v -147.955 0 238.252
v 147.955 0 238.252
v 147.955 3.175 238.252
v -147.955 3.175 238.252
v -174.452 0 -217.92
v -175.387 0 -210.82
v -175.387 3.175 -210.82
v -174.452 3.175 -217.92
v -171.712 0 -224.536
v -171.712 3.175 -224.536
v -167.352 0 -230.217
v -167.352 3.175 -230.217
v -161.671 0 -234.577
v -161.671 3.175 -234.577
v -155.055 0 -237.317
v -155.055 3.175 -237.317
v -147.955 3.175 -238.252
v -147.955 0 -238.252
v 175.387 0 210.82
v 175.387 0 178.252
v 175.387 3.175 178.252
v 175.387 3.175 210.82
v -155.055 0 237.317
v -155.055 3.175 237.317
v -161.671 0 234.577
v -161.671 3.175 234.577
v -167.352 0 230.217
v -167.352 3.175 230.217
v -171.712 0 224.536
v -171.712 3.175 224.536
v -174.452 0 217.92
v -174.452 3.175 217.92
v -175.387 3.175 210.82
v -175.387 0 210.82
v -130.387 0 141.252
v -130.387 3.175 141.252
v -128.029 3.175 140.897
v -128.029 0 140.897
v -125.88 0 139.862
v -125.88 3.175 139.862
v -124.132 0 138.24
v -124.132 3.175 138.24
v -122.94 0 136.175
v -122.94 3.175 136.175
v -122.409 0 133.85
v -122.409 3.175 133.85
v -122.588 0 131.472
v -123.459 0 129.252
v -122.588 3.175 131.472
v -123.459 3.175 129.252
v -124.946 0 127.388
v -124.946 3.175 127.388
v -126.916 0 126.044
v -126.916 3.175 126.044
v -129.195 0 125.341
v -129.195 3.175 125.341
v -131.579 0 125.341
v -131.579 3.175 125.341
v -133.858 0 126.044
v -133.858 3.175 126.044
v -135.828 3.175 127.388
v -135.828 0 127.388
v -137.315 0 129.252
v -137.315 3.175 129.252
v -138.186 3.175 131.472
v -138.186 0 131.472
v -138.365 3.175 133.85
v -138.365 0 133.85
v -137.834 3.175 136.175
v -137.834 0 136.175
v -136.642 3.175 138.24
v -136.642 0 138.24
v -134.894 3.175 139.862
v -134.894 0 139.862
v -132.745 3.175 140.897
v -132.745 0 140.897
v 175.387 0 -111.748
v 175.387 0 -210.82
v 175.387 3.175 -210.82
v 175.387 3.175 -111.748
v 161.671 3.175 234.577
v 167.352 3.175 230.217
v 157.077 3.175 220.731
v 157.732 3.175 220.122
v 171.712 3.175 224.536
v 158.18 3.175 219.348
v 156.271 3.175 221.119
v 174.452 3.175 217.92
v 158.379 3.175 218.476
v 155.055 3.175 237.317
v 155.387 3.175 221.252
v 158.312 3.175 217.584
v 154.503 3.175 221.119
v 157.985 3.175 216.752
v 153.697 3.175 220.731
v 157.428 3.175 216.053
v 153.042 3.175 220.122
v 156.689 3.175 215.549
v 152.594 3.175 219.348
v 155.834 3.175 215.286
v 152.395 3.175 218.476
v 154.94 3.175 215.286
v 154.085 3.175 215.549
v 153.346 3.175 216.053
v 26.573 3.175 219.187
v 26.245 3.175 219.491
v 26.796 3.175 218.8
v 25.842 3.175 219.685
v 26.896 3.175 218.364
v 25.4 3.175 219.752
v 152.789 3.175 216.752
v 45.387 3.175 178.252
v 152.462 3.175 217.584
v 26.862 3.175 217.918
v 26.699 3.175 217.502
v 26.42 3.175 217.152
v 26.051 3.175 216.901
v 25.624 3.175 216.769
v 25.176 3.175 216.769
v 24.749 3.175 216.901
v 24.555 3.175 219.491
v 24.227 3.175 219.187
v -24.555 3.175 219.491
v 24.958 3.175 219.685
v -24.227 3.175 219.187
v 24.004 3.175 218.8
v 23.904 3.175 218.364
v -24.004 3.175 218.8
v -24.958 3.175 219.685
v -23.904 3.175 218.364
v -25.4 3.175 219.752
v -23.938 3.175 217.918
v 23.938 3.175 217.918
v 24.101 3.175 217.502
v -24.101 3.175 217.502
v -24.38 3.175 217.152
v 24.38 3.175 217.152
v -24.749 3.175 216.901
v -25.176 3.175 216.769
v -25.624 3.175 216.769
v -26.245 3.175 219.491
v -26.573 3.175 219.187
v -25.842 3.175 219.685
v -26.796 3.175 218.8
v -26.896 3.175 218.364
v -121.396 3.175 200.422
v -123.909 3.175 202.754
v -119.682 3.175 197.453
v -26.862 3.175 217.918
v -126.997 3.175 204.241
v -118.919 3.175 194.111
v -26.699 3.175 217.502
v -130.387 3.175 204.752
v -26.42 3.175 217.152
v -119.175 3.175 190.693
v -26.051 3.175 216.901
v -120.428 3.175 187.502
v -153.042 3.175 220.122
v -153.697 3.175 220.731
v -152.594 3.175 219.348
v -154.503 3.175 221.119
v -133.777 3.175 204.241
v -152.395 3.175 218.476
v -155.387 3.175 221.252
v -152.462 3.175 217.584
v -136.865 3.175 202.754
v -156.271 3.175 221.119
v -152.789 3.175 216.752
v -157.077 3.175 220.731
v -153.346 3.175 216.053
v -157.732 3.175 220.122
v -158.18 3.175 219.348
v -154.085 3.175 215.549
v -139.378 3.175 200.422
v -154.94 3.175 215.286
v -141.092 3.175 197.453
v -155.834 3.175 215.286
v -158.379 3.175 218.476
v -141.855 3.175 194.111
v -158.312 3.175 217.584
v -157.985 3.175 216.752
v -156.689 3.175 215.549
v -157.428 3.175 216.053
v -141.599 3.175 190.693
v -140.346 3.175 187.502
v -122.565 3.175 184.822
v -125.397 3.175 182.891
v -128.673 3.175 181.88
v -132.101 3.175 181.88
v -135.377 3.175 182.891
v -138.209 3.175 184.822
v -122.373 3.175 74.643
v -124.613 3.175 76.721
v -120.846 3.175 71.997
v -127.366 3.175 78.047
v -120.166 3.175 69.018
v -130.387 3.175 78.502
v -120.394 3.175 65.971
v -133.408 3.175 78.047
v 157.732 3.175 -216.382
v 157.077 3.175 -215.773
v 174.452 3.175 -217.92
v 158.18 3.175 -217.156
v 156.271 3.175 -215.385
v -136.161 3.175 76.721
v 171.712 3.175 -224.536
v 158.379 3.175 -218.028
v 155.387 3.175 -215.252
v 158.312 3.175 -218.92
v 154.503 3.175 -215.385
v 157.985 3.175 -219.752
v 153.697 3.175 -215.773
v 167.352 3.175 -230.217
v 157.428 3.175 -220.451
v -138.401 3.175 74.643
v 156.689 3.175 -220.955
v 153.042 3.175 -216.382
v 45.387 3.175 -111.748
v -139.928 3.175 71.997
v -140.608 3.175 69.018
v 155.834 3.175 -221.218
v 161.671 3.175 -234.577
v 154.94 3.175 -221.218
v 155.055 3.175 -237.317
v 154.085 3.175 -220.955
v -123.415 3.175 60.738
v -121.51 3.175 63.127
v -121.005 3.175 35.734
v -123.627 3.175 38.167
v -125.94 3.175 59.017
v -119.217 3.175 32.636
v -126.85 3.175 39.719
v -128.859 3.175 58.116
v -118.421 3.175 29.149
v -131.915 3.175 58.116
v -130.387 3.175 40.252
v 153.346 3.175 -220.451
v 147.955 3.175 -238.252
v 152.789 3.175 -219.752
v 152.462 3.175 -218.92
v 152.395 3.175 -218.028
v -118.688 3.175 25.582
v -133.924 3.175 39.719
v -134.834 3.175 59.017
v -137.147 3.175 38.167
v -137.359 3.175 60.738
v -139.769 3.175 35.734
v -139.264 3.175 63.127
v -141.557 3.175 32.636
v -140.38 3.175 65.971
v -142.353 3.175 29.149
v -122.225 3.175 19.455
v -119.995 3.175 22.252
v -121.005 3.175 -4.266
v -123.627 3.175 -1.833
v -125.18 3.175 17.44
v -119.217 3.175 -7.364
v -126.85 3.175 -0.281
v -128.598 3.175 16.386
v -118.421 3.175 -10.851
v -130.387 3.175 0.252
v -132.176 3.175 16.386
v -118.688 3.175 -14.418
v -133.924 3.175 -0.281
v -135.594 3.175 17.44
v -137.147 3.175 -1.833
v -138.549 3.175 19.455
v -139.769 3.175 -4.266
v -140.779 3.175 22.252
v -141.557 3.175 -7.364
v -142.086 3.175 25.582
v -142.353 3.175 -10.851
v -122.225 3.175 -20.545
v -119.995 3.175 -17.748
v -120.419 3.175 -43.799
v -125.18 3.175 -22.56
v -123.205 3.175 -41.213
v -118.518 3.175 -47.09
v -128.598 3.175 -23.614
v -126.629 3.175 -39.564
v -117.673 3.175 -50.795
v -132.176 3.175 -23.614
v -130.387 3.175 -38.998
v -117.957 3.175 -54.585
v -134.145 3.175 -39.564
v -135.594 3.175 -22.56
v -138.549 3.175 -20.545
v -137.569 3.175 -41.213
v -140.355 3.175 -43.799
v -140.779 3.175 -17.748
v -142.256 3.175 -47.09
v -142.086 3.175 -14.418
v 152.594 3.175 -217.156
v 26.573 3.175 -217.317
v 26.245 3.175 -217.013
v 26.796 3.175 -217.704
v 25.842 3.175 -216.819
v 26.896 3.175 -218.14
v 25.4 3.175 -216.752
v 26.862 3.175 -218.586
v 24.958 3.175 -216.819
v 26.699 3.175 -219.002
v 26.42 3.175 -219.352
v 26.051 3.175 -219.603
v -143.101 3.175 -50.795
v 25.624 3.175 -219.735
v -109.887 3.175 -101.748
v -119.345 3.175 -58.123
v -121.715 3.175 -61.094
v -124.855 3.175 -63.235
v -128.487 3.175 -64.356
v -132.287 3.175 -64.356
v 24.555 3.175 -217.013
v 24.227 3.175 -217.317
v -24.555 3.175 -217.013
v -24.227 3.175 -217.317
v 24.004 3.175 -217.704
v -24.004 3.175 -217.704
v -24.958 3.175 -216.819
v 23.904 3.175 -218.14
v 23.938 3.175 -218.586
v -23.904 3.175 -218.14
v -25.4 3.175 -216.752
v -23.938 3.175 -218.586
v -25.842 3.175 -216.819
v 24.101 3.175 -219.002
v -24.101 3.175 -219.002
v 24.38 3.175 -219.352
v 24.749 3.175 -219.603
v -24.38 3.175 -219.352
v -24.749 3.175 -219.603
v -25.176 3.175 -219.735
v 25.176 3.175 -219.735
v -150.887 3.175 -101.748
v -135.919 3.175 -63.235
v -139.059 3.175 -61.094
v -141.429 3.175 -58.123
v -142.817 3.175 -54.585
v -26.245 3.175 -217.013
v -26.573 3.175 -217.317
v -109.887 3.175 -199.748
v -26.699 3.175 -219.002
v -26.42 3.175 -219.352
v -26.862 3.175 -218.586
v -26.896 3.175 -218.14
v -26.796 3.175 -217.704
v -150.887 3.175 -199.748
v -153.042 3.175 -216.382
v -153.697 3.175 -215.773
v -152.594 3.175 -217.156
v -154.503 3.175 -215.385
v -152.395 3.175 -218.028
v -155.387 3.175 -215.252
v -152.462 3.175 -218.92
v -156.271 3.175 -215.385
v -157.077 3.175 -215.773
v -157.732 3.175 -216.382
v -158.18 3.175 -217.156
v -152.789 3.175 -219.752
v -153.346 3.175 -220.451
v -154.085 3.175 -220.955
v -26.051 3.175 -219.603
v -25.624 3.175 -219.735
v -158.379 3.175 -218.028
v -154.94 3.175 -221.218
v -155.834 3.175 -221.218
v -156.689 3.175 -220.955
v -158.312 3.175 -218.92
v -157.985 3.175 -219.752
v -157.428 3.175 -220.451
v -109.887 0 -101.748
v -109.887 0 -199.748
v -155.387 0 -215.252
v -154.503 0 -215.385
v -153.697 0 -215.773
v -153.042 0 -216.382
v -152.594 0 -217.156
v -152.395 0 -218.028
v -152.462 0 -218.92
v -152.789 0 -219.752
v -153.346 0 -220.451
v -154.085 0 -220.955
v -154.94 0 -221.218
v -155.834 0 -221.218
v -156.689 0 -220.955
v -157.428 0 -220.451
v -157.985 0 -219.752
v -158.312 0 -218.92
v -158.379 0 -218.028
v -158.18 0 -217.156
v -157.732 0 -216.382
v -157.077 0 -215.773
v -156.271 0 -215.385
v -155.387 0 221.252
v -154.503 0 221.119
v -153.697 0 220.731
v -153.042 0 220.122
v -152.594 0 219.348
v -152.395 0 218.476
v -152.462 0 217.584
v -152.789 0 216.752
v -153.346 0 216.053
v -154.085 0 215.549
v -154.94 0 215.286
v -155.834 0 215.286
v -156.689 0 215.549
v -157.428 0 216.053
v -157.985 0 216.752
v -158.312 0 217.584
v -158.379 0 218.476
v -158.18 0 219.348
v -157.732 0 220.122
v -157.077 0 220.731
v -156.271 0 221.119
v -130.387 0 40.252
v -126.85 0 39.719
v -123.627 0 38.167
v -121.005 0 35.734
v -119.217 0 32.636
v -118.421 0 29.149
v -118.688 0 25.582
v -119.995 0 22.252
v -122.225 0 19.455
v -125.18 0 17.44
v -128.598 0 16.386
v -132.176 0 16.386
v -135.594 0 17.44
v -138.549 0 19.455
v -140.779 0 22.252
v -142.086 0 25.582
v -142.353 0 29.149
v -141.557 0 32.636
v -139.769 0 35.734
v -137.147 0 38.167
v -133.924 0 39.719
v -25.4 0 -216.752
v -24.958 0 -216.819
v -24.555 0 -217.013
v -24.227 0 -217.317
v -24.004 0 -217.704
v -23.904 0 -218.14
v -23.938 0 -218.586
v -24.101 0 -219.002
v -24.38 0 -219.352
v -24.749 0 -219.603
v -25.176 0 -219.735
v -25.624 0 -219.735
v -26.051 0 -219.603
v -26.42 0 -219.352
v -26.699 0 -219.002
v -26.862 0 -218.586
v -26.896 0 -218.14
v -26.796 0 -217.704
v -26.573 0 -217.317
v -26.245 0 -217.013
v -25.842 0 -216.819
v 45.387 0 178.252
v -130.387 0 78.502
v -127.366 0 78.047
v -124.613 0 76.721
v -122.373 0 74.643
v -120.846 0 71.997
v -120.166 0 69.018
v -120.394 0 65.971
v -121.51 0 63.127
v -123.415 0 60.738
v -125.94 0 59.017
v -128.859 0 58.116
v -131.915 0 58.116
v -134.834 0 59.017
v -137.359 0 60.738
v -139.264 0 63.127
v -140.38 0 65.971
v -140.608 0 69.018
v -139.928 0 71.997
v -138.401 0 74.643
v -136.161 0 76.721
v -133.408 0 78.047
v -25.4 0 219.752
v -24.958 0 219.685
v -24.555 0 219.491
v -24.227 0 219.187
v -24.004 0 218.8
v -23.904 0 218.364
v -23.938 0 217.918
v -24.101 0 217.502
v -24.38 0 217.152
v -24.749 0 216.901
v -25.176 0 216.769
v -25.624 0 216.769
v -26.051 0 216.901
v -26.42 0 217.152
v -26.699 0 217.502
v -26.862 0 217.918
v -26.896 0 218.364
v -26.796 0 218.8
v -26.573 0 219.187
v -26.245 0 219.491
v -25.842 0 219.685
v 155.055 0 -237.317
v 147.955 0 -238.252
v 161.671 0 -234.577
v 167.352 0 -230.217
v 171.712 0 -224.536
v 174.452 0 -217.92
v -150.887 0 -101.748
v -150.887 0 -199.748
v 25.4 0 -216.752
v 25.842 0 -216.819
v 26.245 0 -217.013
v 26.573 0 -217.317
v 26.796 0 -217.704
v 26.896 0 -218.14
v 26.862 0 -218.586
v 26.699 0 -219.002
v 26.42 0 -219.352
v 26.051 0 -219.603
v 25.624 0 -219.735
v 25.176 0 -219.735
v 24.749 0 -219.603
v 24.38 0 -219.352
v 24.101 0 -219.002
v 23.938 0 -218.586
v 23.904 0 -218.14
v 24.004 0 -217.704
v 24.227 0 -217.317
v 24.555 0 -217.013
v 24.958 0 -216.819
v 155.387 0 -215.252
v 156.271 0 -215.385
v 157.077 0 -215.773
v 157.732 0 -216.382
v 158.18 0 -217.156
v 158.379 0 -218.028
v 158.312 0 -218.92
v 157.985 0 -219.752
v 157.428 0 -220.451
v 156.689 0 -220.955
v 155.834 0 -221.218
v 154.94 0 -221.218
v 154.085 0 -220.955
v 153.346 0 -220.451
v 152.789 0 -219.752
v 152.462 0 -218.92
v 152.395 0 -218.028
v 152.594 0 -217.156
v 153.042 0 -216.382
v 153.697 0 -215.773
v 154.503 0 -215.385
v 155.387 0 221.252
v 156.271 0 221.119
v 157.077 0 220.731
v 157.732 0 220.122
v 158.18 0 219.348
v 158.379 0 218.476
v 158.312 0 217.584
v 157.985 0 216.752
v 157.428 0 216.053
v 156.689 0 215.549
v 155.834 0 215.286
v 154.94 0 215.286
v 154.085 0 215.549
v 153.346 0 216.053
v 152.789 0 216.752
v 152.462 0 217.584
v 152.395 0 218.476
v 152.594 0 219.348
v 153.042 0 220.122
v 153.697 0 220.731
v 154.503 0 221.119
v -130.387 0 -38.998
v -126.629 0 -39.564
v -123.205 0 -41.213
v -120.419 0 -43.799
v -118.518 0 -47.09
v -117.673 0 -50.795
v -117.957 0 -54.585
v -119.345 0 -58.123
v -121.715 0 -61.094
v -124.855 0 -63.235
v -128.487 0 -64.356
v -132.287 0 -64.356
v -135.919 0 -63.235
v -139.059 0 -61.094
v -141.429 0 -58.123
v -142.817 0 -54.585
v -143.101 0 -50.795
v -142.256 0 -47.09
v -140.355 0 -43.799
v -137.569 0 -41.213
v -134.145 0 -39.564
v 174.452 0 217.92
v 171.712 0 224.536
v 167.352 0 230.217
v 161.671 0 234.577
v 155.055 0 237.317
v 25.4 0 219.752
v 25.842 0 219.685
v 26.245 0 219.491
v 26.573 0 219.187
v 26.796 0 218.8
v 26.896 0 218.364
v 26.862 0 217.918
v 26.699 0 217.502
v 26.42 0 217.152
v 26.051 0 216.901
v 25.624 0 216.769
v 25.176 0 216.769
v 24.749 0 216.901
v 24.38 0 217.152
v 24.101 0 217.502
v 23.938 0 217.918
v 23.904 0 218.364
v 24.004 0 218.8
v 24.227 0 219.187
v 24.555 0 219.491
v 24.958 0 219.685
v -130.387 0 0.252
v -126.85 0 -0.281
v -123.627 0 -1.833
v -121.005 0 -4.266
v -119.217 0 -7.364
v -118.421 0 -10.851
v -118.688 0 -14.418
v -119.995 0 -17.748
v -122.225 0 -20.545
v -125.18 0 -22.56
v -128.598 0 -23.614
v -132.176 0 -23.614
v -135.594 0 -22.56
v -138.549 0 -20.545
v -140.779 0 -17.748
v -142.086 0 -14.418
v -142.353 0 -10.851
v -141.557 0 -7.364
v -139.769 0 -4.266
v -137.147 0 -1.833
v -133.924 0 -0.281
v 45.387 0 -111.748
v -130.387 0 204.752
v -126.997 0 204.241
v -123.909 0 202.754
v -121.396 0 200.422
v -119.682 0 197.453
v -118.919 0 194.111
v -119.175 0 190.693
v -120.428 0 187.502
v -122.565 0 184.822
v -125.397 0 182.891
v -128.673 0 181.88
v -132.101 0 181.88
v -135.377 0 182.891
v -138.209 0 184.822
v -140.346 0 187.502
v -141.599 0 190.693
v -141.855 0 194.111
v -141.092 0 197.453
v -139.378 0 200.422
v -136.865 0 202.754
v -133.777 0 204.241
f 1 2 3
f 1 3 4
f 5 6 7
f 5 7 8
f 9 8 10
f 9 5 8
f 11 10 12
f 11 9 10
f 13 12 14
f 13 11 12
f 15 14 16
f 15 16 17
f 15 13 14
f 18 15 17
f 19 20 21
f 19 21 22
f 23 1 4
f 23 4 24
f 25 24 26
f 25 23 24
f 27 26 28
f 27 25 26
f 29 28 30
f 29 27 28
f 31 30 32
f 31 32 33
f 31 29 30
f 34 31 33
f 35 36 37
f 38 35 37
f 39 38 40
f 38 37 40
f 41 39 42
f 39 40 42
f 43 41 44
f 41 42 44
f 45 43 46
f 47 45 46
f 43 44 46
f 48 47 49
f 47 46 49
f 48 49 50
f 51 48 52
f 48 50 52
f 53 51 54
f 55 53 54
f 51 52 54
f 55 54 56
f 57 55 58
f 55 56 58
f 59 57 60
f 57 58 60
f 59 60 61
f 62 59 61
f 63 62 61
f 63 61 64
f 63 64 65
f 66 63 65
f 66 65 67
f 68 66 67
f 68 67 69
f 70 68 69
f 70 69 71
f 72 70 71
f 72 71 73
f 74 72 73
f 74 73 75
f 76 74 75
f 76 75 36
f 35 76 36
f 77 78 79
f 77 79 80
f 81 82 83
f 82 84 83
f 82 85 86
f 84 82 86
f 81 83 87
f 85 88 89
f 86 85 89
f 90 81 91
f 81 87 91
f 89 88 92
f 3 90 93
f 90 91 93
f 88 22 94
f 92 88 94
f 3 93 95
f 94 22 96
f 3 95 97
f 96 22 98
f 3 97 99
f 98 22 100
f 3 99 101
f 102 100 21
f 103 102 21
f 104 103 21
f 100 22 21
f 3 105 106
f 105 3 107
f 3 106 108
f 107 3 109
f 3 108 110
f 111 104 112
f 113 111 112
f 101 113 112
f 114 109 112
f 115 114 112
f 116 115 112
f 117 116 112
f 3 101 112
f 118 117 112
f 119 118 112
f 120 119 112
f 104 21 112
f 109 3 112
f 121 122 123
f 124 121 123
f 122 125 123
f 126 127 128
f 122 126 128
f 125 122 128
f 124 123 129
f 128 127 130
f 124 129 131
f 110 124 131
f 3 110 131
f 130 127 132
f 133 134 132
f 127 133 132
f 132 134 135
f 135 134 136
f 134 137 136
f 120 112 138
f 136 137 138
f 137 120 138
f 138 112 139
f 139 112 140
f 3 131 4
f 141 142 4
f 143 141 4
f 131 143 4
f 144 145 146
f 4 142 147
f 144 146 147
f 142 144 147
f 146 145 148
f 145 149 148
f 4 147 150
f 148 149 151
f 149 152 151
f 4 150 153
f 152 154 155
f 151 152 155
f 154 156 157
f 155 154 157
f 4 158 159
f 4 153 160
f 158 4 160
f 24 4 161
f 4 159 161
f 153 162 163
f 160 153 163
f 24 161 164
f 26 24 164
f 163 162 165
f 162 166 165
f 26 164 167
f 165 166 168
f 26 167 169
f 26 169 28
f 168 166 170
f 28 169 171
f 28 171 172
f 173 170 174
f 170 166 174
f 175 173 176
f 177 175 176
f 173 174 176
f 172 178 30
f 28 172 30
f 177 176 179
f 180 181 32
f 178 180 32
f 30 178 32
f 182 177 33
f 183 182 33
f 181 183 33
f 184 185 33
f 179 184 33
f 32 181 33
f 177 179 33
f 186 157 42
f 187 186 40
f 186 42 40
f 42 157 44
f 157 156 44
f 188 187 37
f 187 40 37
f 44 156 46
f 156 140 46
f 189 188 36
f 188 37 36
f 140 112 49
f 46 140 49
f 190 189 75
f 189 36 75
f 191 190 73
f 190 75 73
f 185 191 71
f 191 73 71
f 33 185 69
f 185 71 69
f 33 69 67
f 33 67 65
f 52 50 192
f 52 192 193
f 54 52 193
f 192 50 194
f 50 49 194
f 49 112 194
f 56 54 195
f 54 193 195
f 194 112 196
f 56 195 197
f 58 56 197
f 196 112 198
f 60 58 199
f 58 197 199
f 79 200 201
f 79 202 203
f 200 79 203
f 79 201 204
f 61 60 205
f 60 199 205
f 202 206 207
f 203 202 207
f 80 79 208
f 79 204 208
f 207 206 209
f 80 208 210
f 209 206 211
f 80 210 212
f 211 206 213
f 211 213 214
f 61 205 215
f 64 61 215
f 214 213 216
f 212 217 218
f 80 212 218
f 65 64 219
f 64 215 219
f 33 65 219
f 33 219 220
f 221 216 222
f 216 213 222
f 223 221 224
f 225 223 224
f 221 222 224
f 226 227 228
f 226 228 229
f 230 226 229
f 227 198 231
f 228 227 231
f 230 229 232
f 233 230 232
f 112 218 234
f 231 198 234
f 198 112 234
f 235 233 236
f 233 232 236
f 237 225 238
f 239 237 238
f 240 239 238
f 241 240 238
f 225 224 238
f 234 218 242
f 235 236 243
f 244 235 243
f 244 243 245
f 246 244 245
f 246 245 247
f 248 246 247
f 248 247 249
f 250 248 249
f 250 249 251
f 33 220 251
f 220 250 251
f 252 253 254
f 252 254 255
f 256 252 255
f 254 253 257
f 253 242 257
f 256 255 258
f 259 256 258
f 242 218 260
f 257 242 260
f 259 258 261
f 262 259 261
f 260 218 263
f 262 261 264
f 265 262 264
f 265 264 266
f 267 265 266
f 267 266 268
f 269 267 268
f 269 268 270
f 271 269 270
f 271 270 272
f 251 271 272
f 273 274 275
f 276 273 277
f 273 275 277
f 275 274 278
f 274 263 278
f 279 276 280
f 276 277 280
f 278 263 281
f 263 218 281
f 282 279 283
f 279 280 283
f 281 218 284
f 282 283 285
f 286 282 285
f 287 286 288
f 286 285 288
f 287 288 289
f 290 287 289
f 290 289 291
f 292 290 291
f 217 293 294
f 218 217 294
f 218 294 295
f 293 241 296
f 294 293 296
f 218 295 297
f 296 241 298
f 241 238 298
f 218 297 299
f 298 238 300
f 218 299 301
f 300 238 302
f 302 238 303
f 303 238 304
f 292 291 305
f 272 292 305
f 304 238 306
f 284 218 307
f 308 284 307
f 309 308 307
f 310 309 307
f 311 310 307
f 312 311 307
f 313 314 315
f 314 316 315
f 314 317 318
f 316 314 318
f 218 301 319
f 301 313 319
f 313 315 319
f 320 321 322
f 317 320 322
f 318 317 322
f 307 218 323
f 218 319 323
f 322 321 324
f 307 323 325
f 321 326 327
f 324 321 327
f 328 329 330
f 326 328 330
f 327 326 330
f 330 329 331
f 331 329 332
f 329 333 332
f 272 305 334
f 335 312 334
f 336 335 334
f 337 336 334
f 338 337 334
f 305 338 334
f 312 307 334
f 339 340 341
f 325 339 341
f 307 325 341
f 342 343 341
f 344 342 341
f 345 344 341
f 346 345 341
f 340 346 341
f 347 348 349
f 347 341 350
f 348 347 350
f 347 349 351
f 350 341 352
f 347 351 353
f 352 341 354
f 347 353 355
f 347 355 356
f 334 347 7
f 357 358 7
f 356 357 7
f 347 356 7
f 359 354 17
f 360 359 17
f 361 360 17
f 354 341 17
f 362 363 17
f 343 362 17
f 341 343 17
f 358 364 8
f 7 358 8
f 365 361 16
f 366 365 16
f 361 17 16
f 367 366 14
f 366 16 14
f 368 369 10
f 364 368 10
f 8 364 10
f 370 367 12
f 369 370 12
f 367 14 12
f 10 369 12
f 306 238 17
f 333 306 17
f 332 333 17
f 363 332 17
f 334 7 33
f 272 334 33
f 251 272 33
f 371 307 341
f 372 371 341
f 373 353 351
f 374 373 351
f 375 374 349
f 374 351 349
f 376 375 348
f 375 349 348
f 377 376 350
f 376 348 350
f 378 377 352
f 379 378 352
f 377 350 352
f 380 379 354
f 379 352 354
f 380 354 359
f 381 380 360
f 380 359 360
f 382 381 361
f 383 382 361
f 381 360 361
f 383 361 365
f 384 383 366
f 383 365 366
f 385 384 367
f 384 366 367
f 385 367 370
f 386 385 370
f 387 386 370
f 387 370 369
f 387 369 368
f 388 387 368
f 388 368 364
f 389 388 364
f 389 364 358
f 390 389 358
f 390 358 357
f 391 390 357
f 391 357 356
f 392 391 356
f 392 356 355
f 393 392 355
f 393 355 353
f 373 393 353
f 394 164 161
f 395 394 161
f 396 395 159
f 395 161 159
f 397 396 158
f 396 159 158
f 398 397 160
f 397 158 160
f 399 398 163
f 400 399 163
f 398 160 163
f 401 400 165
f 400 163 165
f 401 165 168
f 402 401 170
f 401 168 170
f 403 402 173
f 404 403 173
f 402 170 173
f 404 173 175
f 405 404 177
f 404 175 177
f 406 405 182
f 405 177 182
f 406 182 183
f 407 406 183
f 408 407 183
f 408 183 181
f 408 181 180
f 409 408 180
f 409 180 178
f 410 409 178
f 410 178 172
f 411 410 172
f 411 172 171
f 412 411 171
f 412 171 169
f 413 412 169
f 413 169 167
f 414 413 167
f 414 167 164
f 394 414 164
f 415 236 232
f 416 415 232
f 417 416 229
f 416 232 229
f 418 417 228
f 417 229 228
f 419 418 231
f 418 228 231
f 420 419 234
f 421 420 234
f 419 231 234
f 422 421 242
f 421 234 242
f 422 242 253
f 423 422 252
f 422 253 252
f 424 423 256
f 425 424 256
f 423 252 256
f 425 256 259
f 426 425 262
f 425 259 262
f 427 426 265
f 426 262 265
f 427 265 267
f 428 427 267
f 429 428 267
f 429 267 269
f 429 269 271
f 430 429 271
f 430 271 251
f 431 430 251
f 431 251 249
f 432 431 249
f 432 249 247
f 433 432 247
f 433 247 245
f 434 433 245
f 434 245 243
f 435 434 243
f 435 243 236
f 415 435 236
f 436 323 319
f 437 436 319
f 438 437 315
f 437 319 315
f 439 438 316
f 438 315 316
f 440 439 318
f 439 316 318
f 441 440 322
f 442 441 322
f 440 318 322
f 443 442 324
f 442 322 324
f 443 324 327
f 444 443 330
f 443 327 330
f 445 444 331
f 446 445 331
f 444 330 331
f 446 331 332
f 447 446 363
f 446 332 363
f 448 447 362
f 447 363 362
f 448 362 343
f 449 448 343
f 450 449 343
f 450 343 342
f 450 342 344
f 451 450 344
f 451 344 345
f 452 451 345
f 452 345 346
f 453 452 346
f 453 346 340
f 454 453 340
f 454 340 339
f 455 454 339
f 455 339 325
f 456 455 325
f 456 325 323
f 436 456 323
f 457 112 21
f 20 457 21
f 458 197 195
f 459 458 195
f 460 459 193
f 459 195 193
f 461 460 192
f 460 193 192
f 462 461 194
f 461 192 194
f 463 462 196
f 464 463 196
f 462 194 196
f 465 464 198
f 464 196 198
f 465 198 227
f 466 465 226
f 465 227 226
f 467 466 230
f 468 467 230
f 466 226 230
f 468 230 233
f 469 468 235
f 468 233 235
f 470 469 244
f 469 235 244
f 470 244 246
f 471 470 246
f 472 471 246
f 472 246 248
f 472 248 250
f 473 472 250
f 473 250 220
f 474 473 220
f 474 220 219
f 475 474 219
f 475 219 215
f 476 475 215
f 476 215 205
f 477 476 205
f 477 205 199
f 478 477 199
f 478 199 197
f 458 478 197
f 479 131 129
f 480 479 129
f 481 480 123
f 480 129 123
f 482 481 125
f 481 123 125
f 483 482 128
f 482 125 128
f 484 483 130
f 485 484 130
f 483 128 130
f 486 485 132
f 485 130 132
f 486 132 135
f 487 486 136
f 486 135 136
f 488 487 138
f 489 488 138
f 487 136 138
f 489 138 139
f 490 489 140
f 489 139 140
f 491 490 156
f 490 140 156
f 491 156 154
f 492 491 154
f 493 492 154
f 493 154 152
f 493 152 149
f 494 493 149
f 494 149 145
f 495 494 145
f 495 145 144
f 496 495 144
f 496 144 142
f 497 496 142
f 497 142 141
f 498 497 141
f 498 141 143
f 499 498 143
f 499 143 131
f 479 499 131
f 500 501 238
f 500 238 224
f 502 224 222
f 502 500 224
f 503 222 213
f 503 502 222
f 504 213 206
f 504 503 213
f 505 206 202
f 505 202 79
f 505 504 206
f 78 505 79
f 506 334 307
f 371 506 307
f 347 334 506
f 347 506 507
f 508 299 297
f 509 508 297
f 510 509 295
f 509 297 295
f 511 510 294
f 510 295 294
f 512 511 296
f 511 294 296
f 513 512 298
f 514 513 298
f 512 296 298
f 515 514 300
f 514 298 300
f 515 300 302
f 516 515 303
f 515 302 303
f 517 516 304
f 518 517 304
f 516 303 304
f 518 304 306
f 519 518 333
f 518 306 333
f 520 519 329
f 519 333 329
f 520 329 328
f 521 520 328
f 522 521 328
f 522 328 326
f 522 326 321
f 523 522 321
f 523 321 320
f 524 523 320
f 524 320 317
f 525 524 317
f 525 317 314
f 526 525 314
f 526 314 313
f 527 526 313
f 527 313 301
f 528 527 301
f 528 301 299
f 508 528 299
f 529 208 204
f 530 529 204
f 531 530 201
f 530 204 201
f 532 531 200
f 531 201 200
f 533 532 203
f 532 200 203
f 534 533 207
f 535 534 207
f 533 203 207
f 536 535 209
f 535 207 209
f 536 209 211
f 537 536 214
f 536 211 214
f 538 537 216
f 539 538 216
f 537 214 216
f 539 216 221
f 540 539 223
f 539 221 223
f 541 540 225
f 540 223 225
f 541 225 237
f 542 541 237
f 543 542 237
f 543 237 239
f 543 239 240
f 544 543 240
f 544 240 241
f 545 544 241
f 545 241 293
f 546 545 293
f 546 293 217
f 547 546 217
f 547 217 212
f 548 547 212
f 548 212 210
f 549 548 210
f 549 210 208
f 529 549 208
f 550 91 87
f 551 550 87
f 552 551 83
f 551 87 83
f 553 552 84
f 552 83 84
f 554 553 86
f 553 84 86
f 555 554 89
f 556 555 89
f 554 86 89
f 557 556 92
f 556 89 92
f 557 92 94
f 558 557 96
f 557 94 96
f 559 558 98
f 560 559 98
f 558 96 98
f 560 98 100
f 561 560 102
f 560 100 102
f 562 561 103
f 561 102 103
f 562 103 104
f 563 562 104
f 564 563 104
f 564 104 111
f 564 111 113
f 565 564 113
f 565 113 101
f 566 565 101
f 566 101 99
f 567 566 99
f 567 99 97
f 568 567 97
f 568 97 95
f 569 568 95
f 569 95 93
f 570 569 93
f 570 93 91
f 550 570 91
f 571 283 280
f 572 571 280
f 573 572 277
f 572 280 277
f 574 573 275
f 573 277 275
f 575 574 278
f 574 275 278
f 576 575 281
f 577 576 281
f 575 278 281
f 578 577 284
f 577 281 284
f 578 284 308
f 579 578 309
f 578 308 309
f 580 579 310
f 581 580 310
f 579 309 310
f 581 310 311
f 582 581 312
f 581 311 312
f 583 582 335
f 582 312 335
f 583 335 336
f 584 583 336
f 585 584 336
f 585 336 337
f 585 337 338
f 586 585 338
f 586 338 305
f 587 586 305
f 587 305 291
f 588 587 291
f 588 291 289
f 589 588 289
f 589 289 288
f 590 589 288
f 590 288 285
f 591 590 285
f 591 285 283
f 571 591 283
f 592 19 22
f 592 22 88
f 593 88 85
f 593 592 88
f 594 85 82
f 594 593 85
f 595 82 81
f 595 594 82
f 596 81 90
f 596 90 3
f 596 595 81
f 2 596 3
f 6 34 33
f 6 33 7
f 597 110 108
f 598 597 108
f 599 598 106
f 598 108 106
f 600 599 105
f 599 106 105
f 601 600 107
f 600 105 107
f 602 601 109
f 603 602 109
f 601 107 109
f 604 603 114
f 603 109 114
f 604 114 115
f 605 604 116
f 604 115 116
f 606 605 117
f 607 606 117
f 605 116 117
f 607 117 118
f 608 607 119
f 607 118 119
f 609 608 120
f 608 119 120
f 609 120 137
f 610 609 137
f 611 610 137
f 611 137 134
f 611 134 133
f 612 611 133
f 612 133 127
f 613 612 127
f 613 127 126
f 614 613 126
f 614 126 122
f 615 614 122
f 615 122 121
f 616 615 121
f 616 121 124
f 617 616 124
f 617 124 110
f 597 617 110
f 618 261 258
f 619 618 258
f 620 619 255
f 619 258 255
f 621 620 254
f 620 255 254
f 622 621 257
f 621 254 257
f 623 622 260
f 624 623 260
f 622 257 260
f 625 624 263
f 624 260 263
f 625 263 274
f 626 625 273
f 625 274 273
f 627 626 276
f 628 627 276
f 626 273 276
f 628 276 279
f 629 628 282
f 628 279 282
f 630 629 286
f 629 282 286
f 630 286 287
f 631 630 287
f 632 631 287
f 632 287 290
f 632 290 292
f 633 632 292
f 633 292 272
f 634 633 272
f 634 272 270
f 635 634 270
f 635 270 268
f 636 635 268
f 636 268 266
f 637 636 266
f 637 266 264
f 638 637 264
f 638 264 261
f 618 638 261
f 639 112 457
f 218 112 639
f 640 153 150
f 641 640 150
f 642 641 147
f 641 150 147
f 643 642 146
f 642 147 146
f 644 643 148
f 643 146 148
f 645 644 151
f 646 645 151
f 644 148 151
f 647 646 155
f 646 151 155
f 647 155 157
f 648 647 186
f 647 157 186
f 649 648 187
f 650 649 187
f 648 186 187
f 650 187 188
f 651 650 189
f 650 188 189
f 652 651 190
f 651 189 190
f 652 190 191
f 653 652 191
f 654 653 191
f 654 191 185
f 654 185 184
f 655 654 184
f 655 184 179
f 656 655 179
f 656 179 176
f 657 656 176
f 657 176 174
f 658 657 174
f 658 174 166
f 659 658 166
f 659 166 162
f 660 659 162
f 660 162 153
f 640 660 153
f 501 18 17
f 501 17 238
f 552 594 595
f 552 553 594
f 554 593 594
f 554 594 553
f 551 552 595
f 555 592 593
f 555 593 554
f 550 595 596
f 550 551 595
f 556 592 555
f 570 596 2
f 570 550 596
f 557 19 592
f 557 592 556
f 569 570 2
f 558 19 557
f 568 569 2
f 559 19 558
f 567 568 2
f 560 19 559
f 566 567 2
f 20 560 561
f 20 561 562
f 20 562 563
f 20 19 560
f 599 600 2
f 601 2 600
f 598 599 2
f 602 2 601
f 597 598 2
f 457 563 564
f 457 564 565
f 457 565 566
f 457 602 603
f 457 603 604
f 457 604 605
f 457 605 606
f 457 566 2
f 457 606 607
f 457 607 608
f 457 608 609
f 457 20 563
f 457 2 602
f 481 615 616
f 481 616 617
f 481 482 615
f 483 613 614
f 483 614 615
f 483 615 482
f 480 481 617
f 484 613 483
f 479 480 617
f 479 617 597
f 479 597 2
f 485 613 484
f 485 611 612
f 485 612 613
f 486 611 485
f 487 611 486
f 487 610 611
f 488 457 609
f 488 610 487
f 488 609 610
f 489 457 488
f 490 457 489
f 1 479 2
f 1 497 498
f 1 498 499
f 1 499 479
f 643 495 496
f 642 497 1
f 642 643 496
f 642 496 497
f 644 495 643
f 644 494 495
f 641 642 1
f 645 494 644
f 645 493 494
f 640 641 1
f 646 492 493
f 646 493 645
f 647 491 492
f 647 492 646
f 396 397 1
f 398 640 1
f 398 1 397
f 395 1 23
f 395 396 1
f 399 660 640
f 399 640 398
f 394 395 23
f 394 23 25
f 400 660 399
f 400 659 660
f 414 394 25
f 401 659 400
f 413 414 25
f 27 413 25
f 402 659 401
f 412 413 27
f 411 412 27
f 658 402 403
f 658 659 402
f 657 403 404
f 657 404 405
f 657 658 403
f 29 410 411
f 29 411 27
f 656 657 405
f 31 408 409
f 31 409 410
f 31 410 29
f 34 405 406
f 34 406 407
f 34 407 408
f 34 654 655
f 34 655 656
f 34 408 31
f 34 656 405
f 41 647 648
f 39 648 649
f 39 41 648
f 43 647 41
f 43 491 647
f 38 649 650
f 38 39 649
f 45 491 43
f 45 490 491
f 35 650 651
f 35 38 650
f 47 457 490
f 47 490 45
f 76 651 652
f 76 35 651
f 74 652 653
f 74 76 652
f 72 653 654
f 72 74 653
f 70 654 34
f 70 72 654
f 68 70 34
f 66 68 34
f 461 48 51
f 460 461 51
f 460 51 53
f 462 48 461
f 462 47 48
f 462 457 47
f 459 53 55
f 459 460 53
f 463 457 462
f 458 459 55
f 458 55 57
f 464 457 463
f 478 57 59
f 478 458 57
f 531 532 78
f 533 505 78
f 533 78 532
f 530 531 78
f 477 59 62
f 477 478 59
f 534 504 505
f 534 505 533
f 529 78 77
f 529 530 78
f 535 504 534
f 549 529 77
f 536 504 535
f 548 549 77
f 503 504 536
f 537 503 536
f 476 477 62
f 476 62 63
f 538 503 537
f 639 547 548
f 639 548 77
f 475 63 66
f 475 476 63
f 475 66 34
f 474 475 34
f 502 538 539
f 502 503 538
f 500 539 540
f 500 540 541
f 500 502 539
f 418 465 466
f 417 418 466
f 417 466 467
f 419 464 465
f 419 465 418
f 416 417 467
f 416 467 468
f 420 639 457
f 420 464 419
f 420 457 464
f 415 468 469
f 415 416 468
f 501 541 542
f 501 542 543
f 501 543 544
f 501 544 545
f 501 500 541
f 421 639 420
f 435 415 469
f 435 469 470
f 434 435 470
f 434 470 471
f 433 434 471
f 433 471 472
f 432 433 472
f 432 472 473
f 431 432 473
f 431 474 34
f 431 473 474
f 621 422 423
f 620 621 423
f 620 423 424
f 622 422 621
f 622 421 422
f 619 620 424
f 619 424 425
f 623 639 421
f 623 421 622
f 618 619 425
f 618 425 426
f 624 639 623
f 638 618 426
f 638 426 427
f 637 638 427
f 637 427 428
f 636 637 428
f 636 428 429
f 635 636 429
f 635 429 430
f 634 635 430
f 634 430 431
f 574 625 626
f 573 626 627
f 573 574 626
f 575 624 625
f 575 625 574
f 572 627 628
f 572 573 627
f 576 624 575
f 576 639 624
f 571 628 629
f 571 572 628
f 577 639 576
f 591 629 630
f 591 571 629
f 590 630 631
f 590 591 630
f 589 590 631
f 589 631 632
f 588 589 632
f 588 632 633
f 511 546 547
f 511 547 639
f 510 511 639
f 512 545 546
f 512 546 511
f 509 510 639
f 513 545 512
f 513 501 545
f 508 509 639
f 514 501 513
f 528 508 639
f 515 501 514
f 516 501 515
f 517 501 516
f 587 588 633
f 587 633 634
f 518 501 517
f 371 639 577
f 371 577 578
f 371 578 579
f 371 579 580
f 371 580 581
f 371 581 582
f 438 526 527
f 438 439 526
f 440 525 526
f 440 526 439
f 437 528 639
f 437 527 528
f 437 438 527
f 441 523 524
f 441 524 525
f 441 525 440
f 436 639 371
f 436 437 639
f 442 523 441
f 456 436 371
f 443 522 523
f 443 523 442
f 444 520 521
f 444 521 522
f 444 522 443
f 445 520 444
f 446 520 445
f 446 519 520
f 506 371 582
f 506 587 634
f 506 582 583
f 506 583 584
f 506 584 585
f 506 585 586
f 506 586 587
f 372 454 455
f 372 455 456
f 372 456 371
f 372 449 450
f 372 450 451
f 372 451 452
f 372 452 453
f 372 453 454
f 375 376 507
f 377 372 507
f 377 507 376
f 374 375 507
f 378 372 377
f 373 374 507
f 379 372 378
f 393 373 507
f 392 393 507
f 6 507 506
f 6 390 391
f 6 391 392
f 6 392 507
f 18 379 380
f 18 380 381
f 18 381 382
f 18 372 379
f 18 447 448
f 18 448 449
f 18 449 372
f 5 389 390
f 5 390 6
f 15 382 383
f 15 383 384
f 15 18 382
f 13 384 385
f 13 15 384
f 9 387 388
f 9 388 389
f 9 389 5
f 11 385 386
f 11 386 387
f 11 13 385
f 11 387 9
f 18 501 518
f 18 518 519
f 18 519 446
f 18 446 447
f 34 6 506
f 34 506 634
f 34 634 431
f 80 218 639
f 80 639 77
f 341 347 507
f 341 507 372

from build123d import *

# Parameters (mm, degrees)
BOSS_EXTRUDE1_DEPTH = 3.175
SKETCH2_W           = 130
SKETCH2_H           = 290
CUT_EXTRUDE1_DEPTH  = 10
SKETCH3_R           = 11.5
SKETCH3_R_2         = 8
SKETCH3_R_3         = 10.25
SKETCH3_R_4         = 12
SKETCH3_R_5         = 12.75
SKETCH3_R_6         = 3
SKETCH3_R_7         = 1.5
SKETCH3_W           = 41
SKETCH3_H           = 98
CUT_EXTRUDE2_DEPTH  = 296.862630114


with BuildPart() as part:
    # Sketch1 → Boss-Extrude1 (new body)
    with BuildSketch(Plane(origin=(0, 0, 0), x_dir=(1, 0, 0), z_dir=(0, 1, 0))):
        with BuildLine():
            Line((-147.955, 238.252), (147.955, 238.252))
            ThreePointArc((147.955, 238.252), (167.352353222, 230.217353222), (175.387, 210.82))
            Line((175.387, 210.82), (175.387, -210.82))
            ThreePointArc((175.387, -210.82), (167.352353222, -230.217353222), (147.955, -238.252))
            Line((147.955, -238.252), (-147.955, -238.252))
            ThreePointArc((-147.955, -238.252), (-167.352353222, -230.217353222), (-175.387, -210.82))
            Line((-175.387, -210.82), (-175.387, 210.82))
            ThreePointArc((-175.387, 210.82), (-167.352353222, 230.217353222), (-147.955, 238.252))
        make_face()
    extrude(amount=BOSS_EXTRUDE1_DEPTH)

    # Sketch2 → Cut-Extrude1 (cut)
    with BuildSketch(Plane(origin=(0, 3.175, 0), x_dir=(1, 0, 0), z_dir=(0, 1, 0))):
        with Locations((110.387, -33.252)):
            Rectangle(SKETCH2_W, SKETCH2_H)
    extrude(amount=-CUT_EXTRUDE1_DEPTH, mode=Mode.SUBTRACT)

    # Sketch3 → Cut-Extrude2 (cut, through all)
    with BuildSketch(Plane(origin=(0, 3.175, 0), x_dir=(1, 0, 0), z_dir=(0, 1, 0))):
        with Locations(Location((-130.387, -193.252, 0), (0, 0, 270))):
            Circle(SKETCH3_R)
        with Locations(Location((-130.387, -133.252, 0), (0, 0, 270))):
            Circle(SKETCH3_R_2)
        with Locations(Location((-130.387, -68.252, 0), (0, 0, 270))):
            Circle(SKETCH3_R_3)
        with Locations(Location((-130.387, -28.252, 0), (0, 0, 270))):
            Circle(SKETCH3_R_4)
        with Locations(Location((-130.387, 11.748, 0), (0, 0, 270))):
            Circle(SKETCH3_R_4)
        with Locations(Location((-130.387, 51.748, 0), (0, 0, 270))):
            Circle(SKETCH3_R_5)
        with Locations(Location((155.387, 218.252, 0), (0, 0, 270))):
            Circle(SKETCH3_R_6)
        with Locations(Location((155.387, -218.252, 0), (0, 0, 270))):
            Circle(SKETCH3_R_6)
        with Locations(Location((-155.387, -218.252, 0), (0, 0, 270))):
            Circle(SKETCH3_R_6)
        with Locations(Location((-155.387, 218.252, 0), (0, 0, 270))):
            Circle(SKETCH3_R_6)
        with Locations(Location((-25.4, 218.252, 0), (0, 0, 270))):
            Circle(SKETCH3_R_7)
        with Locations(Location((25.4, 218.252, 0), (0, 0, 270))):
            Circle(SKETCH3_R_7)
        with Locations(Location((-25.4, -218.252, 0), (0, 0, 270))):
            Circle(SKETCH3_R_7)
        with Locations(Location((25.4, -218.252, 0), (0, 0, 270))):
            Circle(SKETCH3_R_7)
        with Locations((-130.387, 150.748)):
            Rectangle(SKETCH3_W, SKETCH3_H)
    extrude(amount=-CUT_EXTRUDE2_DEPTH, mode=Mode.SUBTRACT)


solid = part.part
